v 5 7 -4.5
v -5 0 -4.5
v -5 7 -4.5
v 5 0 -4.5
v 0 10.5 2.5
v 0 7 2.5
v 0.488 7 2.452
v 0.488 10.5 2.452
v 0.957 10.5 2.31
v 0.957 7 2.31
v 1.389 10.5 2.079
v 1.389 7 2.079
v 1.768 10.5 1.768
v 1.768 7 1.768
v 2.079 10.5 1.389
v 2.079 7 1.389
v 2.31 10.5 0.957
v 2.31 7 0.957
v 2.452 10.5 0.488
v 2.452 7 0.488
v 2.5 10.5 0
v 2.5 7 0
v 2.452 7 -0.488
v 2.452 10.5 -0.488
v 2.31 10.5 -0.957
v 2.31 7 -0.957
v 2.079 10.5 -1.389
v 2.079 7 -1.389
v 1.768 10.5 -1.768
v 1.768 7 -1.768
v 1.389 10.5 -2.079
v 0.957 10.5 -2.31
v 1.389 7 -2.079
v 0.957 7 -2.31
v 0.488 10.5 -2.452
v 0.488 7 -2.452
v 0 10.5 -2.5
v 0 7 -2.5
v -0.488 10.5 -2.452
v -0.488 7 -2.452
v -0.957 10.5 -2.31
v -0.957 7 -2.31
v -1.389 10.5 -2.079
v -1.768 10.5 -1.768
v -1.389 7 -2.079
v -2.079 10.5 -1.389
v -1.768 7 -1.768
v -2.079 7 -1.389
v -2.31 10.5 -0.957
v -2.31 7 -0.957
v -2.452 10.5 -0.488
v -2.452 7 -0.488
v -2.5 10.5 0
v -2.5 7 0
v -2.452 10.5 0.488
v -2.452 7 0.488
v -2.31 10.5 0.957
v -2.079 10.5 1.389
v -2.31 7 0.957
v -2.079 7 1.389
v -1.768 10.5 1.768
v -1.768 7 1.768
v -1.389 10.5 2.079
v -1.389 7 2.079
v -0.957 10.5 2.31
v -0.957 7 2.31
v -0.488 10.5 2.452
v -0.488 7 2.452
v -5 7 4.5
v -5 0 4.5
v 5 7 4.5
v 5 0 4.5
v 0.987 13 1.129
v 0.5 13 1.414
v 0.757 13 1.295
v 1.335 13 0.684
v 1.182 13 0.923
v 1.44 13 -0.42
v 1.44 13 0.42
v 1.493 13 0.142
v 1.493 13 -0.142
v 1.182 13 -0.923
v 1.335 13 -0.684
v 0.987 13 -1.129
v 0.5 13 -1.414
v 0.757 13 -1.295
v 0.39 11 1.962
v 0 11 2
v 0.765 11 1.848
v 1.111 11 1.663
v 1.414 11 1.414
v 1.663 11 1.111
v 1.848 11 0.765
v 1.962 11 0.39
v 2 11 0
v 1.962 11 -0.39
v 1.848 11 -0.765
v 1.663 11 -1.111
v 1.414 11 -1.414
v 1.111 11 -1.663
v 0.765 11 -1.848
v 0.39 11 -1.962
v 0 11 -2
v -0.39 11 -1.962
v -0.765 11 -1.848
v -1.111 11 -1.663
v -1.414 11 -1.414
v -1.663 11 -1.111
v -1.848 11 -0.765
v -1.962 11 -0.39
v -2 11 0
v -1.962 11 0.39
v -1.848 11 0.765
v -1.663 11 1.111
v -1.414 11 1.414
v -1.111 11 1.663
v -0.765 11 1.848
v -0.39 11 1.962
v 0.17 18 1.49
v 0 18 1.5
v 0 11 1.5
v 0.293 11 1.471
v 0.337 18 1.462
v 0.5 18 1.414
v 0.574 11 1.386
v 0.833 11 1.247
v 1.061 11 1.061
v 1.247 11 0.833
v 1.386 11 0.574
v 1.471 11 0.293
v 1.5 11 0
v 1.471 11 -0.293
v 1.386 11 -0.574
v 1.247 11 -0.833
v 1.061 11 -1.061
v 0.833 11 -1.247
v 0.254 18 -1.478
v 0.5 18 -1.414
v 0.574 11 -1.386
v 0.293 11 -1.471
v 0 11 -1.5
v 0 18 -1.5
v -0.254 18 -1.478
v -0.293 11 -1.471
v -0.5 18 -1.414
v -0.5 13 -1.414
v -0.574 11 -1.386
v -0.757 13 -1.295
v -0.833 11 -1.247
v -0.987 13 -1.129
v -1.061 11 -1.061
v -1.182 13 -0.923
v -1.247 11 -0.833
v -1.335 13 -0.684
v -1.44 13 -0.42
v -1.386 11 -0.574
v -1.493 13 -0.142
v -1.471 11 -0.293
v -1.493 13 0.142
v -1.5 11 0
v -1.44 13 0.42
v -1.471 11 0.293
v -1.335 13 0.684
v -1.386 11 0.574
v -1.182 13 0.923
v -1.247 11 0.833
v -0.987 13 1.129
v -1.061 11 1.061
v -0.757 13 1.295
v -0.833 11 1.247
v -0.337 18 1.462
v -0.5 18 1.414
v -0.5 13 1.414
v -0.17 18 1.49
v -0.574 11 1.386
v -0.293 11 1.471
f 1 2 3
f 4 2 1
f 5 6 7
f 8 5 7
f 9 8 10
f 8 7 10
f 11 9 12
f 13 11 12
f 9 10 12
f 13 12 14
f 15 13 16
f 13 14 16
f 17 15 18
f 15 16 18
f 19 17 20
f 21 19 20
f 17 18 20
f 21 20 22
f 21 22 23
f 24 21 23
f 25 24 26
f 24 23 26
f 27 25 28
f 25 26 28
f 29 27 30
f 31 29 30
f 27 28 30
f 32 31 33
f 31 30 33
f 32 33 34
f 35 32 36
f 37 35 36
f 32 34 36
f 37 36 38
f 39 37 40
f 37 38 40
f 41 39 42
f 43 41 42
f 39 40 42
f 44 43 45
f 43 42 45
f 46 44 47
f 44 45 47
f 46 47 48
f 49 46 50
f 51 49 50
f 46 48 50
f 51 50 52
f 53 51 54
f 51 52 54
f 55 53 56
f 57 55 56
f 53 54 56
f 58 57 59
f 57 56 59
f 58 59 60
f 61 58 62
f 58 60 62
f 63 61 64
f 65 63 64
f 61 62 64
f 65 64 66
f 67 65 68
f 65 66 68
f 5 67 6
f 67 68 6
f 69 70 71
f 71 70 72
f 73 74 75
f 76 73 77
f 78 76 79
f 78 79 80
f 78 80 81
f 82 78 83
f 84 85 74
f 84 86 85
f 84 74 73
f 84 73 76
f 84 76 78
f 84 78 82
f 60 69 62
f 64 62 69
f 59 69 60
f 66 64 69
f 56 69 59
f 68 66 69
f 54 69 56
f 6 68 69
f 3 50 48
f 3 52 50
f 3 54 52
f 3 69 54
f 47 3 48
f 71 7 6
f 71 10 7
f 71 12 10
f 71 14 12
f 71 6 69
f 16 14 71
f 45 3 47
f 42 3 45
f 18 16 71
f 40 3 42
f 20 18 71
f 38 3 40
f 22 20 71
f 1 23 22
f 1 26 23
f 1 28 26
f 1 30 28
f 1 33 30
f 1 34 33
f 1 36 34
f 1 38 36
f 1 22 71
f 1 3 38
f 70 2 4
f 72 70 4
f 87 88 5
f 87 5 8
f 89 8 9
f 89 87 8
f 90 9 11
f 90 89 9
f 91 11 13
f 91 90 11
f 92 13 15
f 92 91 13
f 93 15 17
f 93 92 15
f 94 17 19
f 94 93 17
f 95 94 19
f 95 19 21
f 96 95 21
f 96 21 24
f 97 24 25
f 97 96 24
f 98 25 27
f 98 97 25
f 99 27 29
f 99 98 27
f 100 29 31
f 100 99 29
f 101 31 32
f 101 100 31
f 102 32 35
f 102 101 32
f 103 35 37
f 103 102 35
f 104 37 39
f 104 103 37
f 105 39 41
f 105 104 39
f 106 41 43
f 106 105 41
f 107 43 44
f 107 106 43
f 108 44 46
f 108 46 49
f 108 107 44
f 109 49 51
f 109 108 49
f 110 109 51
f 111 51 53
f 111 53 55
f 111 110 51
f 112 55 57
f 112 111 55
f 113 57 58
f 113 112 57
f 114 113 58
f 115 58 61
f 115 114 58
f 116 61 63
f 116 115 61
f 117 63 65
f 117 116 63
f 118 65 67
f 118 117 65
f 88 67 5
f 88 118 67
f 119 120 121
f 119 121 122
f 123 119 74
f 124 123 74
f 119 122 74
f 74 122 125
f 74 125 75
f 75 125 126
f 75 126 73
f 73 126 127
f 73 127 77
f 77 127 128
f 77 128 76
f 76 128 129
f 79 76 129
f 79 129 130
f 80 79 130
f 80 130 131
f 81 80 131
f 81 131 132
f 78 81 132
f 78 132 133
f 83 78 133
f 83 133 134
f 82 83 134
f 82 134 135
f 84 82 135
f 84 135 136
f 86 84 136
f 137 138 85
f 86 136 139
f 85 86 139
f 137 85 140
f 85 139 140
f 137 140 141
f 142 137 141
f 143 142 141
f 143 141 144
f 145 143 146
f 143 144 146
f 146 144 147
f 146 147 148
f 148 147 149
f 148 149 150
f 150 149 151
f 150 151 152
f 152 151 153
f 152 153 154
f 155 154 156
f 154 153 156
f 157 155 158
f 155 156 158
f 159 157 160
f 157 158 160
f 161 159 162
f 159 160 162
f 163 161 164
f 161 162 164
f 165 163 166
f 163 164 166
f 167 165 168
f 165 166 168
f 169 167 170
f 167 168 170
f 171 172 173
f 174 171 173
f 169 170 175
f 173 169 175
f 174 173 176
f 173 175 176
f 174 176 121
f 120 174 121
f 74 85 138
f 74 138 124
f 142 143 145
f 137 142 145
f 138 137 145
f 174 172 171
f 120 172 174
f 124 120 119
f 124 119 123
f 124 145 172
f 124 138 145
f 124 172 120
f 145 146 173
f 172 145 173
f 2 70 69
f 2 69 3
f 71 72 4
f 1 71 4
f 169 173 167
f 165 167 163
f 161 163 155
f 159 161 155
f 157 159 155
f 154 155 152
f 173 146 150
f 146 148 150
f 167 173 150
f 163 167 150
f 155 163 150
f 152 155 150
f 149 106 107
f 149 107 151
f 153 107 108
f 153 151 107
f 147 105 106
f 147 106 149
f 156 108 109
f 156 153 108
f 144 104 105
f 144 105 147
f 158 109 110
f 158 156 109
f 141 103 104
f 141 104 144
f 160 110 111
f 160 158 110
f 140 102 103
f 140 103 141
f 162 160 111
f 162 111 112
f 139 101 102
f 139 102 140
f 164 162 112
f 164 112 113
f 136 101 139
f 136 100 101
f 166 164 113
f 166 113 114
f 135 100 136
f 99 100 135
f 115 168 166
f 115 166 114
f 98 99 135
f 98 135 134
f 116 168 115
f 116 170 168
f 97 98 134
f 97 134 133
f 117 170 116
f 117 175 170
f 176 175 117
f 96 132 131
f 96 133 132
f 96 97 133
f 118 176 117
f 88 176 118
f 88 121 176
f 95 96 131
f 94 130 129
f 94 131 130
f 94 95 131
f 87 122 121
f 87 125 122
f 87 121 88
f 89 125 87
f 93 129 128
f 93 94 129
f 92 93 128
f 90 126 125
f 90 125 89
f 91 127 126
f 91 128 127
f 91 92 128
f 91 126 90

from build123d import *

# Parameters (mm, degrees)
SKETCH_1_W          = 10
SKETCH_1_H          = 9
EXTRUDE_1_DEPTH     = 7
SKETCH_2_R          = 2.5
EXTRUDE_2_DEPTH     = 4
CHAMFER_1_SIZE      = 0.5
SKETCH_3_R          = 1.5
EXTRUDE_3_DEPTH     = 7
CUT_EXTRUDE_START   = -5
CUT_EXTRUDE_1_DEPTH = 5


with BuildPart() as part:
    # 草图1 → 凸台-拉伸1 (new body)
    with BuildSketch(Plane(origin=(0, 0, 0), x_dir=(1, 0, 0), z_dir=(0, 1, 0))):
        Rectangle(SKETCH_1_W, SKETCH_1_H)
    extrude(amount=EXTRUDE_1_DEPTH)

    # 草图2 → 凸台-拉伸2 (add)
    with BuildSketch(Plane(origin=(0, 7, 0), x_dir=(1, 0, 0), z_dir=(0, 1, 0))):
        with Locations(Location((0, 0, 0), (0, 0, 270))):
            Circle(SKETCH_2_R)
    extrude(amount=EXTRUDE_2_DEPTH)

    # 倒角1
    chamfer_1_edges = [part.edges().sort_by_distance(p)[0] for p in [
        (0, 11, -2.5),
    ]]
    chamfer(chamfer_1_edges, length=CHAMFER_1_SIZE)

    # 草图3 → 凸台-拉伸3 (add)
    with BuildSketch(Plane(origin=(0, 11, 0), x_dir=(1, 0, 0), z_dir=(0, 1, 0))):
        with Locations(Location((0, 0, 0), (0, 0, 270))):
            Circle(SKETCH_3_R)
    extrude(amount=EXTRUDE_3_DEPTH)

    # 草图4 → 切除-拉伸1 (cut)
    with BuildSketch(Plane(origin=(0, 18, 0), x_dir=(1, 0, 0), z_dir=(0, 1, 0)).offset(CUT_EXTRUDE_START)):
        with BuildLine():
            Line((-0.5, 1.414213562), (-0.5, -1.414213562))
            ThreePointArc((-0.5, -1.414213562), (-1.5, 0), (-0.5, 1.414213562))
        make_face()
        with BuildLine():
            Line((0.5, 1.414213562), (0.5, -1.414213562))
            ThreePointArc((0.5, -1.414213562), (1.5, 0), (0.5, 1.414213562))
        make_face()
    extrude(amount=CUT_EXTRUDE_1_DEPTH, mode=Mode.SUBTRACT)


solid = part.part
